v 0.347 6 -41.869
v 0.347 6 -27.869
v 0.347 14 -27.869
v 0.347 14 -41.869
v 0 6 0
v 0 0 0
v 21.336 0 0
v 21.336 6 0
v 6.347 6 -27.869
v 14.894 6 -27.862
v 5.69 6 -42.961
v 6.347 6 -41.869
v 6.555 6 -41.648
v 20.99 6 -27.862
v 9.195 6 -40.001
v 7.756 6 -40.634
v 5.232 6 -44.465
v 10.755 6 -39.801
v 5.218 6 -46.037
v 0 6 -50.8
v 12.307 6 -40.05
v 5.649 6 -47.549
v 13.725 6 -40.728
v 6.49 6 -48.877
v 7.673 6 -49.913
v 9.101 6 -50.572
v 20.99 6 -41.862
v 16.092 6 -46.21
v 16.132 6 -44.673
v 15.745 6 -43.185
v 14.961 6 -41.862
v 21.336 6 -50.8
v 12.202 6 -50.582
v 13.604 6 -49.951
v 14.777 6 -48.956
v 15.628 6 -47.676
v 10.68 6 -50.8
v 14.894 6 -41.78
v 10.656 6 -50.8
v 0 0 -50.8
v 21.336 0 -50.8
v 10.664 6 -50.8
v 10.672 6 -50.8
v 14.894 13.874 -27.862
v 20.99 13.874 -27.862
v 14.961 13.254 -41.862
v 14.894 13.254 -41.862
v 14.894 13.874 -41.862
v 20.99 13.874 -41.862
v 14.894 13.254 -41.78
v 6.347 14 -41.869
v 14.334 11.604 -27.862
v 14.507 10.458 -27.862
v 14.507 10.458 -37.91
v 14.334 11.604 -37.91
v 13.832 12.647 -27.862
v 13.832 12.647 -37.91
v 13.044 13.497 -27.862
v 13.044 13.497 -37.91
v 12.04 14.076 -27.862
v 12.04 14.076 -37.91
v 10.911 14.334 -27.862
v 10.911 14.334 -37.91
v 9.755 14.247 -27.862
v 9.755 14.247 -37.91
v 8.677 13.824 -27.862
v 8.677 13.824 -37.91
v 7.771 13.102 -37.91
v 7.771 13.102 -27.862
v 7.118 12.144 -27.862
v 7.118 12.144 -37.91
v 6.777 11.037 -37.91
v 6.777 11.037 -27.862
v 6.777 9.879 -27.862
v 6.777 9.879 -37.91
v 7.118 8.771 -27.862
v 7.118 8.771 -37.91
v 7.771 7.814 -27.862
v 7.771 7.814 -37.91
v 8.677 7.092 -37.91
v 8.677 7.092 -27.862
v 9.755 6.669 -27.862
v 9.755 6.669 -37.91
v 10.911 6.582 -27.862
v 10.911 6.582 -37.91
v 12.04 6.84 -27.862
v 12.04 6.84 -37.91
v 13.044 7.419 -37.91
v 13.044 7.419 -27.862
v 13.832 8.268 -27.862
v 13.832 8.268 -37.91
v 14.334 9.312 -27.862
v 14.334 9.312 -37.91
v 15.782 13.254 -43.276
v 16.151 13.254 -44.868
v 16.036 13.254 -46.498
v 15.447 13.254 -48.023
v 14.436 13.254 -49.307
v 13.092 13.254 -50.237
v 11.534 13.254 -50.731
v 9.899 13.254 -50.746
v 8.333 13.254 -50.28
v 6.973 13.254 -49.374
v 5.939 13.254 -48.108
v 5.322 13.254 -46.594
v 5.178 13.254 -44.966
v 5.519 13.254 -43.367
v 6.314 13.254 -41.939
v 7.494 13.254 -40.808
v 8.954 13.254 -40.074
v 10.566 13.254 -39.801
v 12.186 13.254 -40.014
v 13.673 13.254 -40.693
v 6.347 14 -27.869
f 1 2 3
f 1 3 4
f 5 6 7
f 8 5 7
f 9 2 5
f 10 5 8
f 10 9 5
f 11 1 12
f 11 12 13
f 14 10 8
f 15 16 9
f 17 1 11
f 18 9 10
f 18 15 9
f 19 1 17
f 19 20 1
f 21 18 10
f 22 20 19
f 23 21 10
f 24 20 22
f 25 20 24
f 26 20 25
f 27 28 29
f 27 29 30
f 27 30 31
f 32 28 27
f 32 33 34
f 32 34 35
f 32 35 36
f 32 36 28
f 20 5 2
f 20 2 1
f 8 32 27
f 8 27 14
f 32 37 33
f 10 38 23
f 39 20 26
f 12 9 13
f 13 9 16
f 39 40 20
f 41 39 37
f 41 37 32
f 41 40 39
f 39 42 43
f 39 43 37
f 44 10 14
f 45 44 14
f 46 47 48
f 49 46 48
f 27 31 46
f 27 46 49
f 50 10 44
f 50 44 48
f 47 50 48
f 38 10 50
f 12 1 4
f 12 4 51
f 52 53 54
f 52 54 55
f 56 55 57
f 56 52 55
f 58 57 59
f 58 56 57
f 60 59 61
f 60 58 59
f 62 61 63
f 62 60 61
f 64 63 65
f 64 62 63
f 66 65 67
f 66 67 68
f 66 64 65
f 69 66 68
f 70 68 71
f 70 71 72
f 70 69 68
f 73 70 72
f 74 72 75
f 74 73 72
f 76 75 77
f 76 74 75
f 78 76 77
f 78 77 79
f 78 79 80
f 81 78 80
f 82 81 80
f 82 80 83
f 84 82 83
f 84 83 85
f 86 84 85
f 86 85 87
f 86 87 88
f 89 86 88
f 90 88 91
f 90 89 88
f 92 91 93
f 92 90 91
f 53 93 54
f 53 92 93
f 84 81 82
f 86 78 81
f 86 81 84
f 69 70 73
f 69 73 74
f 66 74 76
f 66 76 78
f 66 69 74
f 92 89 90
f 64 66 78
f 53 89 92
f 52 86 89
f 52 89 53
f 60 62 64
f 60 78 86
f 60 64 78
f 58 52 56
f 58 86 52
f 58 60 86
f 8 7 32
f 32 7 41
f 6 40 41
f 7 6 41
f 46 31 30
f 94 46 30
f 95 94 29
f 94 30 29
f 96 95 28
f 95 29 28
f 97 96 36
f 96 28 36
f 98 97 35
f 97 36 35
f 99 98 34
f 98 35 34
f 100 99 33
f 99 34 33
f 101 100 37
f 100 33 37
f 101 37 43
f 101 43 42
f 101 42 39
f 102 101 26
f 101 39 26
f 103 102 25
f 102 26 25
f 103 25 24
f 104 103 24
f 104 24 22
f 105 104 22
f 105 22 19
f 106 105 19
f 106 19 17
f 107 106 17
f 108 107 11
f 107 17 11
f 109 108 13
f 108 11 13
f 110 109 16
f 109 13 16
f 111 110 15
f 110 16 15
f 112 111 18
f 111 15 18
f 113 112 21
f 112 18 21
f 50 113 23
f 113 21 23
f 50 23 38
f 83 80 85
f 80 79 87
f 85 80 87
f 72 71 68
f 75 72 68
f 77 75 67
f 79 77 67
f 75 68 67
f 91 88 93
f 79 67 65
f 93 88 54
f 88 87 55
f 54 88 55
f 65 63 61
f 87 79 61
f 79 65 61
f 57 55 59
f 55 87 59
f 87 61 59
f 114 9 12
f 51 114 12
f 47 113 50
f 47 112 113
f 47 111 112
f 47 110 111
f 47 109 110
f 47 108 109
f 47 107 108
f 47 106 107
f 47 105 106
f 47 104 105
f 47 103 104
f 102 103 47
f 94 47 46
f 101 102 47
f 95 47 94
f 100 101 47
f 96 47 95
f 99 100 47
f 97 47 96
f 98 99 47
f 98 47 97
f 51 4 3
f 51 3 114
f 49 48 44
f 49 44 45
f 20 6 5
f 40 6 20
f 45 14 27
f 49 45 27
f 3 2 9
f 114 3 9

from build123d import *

# Parameters (mm, degrees)
SKETCH1_W           = 21.336
SKETCH1_H           = 50.8
BOSS_EXTRUDE1_DEPTH = 5.999988
SKETCH4_R           = 5.5000017
BOSS_EXTRUDE4_DEPTH = 7.254
SKETCH5_W           = 6
SKETCH5_H           = 14
BOSS_EXTRUDE5_DEPTH = 8
SKETCH8_W           = 6.096
SKETCH8_H           = 14
BOSS_EXTRUDE6_DEPTH = 7.874
SKETCH12_R          = 3.886840465
BOSS_EXTRUDE8_DEPTH = 10.048


with BuildPart() as part:
    # Sketch1 → Boss-Extrude1 (new body)
    with BuildSketch(Plane(origin=(0, 0, 0), x_dir=(1, 0, 0), z_dir=(0, 1, 0))):
        with Locations((10.668, 25.4)):
            Rectangle(SKETCH1_W, SKETCH1_H)
    extrude(amount=BOSS_EXTRUDE1_DEPTH)



with BuildPart() as body_2:
    # Sketch4 → Boss-Extrude4 (new body)
    with BuildSketch(Plane(origin=(0, 5.999988, 0), x_dir=(1, 0, 0), z_dir=(0, 1, 0))):
        with Locations((10.668, 45.300011)):
            Circle(SKETCH4_R)
    extrude(amount=BOSS_EXTRUDE4_DEPTH)


with BuildPart() as part_1:
    add(part.part)

    add(body_2.part)  # Boss-Extrude5 merges body 2
    # Sketch5 → Boss-Extrude5 (add)
    with BuildSketch(Plane(origin=(0, 5.999988, 0), x_dir=(1, 0, 0), z_dir=(0, 1, 0))):
        with Locations((3.34654218, 34.868853019)):
            Rectangle(SKETCH5_W, SKETCH5_H)
    extrude(amount=BOSS_EXTRUDE5_DEPTH)

    # Sketch8 → Boss-Extrude6 (add)
    with BuildSketch(Plane(origin=(0, 5.999988, 0), x_dir=(1, 0, 0), z_dir=(0, 1, 0))):
        with Locations((17.941915959, 34.862132364)):
            Rectangle(SKETCH8_W, SKETCH8_H)
    extrude(amount=BOSS_EXTRUDE6_DEPTH)


with BuildPart() as body_2_2:
    # Sketch12 → Boss-Extrude8 (new body)
    with BuildSketch(Plane.XY.offset(-27.862132364)):
        with Locations((10.62022907, 10.457914519)):
            Circle(SKETCH12_R)
    extrude(amount=-BOSS_EXTRUDE8_DEPTH)


solid = Compound([part_1.part, body_2_2.part])
